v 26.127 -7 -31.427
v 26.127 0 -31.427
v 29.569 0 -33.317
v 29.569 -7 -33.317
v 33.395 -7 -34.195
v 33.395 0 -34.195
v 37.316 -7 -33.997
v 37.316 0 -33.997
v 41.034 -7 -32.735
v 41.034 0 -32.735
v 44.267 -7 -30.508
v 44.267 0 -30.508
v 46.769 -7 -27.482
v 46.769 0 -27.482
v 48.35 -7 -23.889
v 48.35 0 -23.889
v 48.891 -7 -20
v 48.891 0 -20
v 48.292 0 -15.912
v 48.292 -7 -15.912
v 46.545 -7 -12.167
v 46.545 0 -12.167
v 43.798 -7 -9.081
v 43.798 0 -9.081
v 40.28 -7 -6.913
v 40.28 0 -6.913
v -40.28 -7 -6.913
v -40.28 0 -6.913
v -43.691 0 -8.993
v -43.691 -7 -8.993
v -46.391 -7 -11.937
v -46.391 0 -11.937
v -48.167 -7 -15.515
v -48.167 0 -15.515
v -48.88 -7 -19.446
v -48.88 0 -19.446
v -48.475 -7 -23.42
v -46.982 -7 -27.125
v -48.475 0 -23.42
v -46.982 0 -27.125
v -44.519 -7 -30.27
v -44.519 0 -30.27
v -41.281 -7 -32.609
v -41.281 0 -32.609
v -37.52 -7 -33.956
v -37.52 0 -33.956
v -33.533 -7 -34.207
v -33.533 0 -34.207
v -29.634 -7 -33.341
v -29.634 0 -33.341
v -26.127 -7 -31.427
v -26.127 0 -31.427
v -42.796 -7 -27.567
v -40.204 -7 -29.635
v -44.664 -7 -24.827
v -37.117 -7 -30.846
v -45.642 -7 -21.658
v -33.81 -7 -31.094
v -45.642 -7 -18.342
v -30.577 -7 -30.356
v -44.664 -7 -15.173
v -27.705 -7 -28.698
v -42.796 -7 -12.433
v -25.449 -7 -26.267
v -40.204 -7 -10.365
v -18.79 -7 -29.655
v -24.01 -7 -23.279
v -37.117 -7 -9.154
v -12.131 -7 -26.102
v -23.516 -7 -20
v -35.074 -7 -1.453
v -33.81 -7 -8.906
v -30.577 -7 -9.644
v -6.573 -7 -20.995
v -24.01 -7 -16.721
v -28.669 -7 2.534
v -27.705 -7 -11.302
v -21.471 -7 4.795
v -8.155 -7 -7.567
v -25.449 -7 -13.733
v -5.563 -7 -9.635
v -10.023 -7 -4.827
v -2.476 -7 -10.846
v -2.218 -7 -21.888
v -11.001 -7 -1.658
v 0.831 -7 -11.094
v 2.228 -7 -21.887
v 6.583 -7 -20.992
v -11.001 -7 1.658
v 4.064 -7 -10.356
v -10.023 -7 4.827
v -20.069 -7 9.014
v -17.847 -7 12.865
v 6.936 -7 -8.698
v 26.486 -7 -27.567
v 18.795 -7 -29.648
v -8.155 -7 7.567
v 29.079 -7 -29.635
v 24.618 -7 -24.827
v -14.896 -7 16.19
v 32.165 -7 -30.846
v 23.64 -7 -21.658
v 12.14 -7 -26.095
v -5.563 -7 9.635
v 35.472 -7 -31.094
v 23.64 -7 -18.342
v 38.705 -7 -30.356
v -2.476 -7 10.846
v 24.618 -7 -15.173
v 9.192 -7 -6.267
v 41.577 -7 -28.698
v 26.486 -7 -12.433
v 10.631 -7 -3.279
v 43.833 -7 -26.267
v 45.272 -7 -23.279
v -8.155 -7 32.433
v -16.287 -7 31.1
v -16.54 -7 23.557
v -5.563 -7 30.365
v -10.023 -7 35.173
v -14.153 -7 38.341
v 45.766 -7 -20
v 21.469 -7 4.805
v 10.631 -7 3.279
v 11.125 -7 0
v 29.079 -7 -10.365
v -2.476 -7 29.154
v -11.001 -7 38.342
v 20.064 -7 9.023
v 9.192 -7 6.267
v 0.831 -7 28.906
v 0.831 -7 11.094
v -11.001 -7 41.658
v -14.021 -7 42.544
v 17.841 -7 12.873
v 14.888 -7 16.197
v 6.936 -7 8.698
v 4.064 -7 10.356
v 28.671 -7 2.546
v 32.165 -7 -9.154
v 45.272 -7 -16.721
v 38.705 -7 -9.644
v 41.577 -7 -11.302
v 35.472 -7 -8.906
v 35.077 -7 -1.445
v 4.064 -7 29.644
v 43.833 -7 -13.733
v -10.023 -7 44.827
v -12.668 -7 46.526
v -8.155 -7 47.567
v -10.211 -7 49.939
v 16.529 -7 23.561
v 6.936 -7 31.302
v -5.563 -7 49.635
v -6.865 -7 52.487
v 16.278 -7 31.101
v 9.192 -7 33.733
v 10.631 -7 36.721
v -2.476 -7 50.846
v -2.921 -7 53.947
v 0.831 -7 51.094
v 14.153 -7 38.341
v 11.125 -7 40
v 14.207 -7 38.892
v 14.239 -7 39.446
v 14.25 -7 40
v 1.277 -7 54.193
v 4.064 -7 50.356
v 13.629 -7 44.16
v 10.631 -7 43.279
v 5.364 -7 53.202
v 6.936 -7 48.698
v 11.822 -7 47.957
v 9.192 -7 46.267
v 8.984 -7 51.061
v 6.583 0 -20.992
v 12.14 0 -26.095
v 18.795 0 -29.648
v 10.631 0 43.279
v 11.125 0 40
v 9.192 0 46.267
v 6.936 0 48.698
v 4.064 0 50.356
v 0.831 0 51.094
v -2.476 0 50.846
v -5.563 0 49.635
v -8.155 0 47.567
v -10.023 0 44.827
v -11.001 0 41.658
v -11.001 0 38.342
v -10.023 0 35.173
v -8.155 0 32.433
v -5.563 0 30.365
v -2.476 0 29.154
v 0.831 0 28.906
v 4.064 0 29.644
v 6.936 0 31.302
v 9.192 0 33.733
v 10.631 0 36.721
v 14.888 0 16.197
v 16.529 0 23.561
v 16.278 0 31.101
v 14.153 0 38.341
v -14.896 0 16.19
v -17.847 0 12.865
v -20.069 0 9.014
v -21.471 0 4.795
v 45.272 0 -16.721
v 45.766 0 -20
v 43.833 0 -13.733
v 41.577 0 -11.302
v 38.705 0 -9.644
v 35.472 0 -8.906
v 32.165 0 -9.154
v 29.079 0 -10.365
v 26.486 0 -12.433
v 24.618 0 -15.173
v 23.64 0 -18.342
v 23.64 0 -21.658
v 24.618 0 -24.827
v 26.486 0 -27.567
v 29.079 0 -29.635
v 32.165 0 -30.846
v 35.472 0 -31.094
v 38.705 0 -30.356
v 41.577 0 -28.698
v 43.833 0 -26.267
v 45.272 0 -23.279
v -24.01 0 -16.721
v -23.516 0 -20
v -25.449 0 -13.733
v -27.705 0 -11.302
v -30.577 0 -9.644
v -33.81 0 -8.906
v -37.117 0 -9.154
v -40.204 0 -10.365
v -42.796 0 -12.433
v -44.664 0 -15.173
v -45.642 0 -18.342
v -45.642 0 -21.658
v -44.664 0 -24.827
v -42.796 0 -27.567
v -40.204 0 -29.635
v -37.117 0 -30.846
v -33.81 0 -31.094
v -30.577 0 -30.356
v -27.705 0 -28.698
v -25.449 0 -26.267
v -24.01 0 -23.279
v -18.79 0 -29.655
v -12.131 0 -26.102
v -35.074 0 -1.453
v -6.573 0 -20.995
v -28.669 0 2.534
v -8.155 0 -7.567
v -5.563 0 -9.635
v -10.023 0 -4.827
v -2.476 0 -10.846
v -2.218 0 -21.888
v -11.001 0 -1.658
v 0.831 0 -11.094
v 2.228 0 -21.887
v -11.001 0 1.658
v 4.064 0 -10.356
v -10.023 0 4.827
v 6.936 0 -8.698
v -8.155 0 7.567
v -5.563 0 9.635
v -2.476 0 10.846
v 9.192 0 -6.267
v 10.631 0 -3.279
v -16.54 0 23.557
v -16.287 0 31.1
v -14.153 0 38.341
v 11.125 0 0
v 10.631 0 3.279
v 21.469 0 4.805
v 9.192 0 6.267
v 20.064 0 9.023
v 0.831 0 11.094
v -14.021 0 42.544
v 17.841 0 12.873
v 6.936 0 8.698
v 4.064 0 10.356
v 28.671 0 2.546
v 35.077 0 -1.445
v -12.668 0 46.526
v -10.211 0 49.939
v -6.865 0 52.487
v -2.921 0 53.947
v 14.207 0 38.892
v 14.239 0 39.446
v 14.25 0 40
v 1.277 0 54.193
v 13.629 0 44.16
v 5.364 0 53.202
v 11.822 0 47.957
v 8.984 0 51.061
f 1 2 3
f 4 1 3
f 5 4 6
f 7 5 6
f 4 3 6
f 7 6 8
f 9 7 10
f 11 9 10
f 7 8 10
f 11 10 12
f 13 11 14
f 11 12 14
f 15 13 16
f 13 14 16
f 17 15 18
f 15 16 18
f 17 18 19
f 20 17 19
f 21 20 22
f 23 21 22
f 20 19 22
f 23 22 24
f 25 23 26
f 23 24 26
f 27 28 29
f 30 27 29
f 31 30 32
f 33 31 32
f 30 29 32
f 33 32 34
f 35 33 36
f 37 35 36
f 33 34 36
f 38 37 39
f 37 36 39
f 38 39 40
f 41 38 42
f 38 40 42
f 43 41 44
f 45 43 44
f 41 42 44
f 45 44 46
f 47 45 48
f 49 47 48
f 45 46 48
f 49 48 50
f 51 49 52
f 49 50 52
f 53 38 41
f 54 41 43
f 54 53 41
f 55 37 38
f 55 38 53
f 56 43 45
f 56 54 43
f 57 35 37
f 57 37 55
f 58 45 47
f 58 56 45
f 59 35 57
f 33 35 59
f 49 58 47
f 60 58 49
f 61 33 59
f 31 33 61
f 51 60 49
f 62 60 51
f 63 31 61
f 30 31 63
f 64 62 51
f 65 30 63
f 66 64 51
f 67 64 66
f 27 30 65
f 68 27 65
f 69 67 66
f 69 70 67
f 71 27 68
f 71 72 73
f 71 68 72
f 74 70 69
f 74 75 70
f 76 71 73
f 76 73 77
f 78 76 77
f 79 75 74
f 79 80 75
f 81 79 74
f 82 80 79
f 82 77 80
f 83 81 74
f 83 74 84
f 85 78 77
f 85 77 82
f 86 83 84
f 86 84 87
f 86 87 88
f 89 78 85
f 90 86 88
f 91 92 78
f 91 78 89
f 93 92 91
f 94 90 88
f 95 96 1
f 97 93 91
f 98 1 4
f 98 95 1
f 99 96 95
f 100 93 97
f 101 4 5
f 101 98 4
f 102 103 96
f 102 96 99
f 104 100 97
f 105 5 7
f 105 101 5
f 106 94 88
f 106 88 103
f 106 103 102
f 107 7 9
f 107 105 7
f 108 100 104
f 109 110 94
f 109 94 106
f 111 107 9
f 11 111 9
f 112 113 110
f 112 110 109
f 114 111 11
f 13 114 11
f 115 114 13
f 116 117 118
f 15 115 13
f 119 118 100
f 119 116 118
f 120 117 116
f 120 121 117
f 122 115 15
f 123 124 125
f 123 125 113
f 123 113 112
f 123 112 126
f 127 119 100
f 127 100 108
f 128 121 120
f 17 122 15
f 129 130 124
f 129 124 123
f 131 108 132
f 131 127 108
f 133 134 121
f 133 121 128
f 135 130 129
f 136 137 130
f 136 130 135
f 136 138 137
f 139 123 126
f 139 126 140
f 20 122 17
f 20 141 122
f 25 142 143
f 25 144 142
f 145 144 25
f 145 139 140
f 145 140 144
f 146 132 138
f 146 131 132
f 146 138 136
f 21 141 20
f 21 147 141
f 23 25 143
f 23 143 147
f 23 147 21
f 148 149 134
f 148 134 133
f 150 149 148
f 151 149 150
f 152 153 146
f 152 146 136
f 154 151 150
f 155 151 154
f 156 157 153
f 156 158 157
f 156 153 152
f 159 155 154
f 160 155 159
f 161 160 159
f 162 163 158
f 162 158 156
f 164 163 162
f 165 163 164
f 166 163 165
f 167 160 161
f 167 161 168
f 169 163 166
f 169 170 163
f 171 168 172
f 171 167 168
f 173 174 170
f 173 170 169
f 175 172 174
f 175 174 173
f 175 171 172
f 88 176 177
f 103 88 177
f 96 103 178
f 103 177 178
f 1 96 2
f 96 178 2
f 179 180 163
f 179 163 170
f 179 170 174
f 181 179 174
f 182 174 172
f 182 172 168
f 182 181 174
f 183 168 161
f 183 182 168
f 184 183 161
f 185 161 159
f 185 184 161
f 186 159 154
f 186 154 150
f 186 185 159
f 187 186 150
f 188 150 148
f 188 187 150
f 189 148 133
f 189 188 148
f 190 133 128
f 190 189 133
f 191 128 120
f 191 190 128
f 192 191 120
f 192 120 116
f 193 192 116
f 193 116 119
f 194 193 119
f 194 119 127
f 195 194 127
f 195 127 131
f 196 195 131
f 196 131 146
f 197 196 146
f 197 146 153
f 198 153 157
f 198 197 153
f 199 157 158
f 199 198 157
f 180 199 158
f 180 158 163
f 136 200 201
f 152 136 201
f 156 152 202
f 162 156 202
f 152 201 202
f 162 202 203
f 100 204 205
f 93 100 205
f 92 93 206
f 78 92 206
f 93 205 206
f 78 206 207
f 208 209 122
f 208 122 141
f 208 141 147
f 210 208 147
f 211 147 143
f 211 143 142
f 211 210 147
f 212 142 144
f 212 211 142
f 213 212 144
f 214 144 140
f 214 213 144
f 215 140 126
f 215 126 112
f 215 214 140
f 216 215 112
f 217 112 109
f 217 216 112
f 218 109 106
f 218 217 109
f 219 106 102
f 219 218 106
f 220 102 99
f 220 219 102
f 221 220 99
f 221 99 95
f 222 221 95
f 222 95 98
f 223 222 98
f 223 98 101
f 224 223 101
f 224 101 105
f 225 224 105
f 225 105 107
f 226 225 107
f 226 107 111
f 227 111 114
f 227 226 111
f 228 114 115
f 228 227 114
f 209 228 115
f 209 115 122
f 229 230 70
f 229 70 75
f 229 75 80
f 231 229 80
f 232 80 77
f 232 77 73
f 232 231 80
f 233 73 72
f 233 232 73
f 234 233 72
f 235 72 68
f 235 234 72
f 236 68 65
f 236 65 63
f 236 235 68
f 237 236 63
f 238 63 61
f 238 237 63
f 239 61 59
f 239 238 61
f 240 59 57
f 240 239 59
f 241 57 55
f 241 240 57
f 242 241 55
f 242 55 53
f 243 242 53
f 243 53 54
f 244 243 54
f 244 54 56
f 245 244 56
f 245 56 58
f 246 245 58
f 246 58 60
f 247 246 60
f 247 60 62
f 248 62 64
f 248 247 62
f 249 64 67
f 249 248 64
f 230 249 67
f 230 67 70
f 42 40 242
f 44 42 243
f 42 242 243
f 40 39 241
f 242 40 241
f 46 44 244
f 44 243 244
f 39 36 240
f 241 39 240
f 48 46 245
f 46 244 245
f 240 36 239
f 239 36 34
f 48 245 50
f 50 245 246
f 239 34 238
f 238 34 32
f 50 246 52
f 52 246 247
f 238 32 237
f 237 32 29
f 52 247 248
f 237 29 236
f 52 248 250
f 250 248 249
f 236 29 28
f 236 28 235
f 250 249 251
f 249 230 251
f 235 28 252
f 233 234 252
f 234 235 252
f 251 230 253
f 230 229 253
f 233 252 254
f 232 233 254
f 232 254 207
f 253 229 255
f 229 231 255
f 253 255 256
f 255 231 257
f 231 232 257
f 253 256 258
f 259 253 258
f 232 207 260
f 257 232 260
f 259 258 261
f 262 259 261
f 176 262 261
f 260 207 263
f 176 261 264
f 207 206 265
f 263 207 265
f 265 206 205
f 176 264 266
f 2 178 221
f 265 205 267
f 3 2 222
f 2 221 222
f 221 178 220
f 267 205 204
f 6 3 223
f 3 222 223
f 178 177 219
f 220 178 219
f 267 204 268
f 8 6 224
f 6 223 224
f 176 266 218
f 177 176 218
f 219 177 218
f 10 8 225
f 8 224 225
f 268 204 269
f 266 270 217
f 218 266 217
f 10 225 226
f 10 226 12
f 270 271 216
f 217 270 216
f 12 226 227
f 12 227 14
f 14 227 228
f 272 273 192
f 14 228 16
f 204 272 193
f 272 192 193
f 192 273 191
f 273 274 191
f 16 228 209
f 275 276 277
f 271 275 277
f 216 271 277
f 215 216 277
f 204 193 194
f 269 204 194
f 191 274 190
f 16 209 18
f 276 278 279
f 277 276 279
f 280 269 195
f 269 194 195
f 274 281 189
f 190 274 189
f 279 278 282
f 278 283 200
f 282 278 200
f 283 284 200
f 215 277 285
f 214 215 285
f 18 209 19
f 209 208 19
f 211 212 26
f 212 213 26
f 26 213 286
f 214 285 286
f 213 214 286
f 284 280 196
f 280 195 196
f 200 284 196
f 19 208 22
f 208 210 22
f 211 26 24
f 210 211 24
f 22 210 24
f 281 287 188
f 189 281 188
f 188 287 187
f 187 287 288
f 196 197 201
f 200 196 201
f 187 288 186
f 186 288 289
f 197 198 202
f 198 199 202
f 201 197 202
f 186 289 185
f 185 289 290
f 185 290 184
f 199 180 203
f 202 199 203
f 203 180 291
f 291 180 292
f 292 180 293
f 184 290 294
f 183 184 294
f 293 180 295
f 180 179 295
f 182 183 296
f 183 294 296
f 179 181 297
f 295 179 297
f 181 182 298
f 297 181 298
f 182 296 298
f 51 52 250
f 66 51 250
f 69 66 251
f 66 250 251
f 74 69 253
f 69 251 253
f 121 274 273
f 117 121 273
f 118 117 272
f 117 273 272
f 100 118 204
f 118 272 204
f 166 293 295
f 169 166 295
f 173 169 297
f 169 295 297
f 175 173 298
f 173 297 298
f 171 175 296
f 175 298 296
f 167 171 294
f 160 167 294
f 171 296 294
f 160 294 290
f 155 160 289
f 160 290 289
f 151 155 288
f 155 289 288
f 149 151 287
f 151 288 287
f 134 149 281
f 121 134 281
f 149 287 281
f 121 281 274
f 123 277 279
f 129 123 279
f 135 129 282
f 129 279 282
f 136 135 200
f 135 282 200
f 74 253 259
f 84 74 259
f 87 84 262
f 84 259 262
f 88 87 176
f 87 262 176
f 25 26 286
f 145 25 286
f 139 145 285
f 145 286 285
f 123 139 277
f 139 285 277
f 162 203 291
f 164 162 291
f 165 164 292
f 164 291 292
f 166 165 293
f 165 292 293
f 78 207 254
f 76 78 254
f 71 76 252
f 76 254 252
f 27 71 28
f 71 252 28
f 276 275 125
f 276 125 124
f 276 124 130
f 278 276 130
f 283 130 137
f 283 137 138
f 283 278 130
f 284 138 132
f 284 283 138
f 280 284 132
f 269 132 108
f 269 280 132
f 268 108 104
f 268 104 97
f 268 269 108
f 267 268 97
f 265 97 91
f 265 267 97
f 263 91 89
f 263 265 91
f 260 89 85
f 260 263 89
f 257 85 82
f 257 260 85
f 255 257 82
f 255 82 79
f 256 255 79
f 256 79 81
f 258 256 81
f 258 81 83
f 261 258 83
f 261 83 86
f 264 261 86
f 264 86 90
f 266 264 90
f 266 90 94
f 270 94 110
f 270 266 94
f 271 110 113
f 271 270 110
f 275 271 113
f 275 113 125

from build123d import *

# Parameters (mm, degrees)
F0_R     = 11.125
F1_DEPTH = 7


with BuildPart() as f1:
    # F0 (on Front) → F1 (new body)
    with BuildSketch(Plane.XZ):
        with BuildLine():
            ThreePointArc((-10.632867, 8.318182), (0, 16.5), (10.632867, 8.318182))
            ThreePointArc((10.632867, 8.318182), (13.056476, 12.097679), (14.888415, 16.196762))
            ThreePointArc((14.888415, 16.196762), (16.6416, 27.339077), (14.153044, 38.340529))
            ThreePointArc((14.153044, 38.340529), (0, 25.75), (-14.153044, 38.340529))
            ThreePointArc((-14.153044, 38.340529), (-16.65233, 27.336563), (-14.895904, 16.189874))
            ThreePointArc((-14.895904, 16.189874), (-13.06061, 12.093603), (-10.632867, 8.318182))
        make_face()
        with BuildLine():
            ThreePointArc((-12.52019, 5.049242), (-11.691343, 6.75), (-10.632867, 8.318182))
            ThreePointArc((-10.632867, 8.318182), (-13.06061, 12.093603), (-14.895904, 16.189874))
            ThreePointArc((-14.895904, 16.189874), (-19.055102, 10.995594), (-21.471015, 4.795365))
            ThreePointArc((-21.471015, 4.795365), (-17.005135, 5.2584), (-12.52019, 5.049242))
        make_face()
        with BuildLine():
            ThreePointArc((-6.57289, -20.995169), (-3.943063, -17.357621), (-1.887323, -13.367423))
            ThreePointArc((-1.887323, -13.367423), (-14.289419, -8.25), (-12.52019, 5.049242))
            ThreePointArc((-12.52019, 5.049242), (-17.005135, 5.2584), (-21.471015, 4.795365))
            ThreePointArc((-21.471015, 4.795365), (-31.997135, 0.74251), (-40.280394, -6.913369))
            ThreePointArc((-40.280394, -6.913369), (-26.808348, -8.095723), (-20.391016, -20))
            ThreePointArc((-20.391016, -20), (-21.905588, -26.393073), (-26.12735, -31.42716))
            ThreePointArc((-26.12735, -31.42716), (-15.347993, -28.089622), (-6.57289, -20.995169))
        make_face()
        with BuildLine():
            ThreePointArc((6.582599, -20.992127), (3.948659, -17.356079), (1.887323, -13.367423))
            ThreePointArc((1.887323, -13.367423), (0, -13.5), (-1.887323, -13.367423))
            ThreePointArc((-1.887323, -13.367423), (-3.943063, -17.357621), (-6.57289, -20.995169))
            ThreePointArc((-6.57289, -20.995169), (0.005087, -21.999999), (6.582599, -20.992127))
        make_face()
        with BuildLine():
            ThreePointArc((21.468795, 4.805294), (17.003672, 5.264018), (12.52019, 5.049242))
            ThreePointArc((12.52019, 5.049242), (14.289419, -8.25), (1.887323, -13.367423))
            ThreePointArc((1.887323, -13.367423), (3.948659, -17.356079), (6.582599, -20.992127))
            ThreePointArc((6.582599, -20.992127), (15.355535, -28.081587), (26.12735, -31.42716))
            ThreePointArc((26.12735, -31.42716), (22.300154, -12.875), (40.280394, -6.913369))
            ThreePointArc((40.280394, -6.913369), (32.000323, 0.753059), (21.468795, 4.805294))
        make_face()
        with BuildLine():
            ThreePointArc((12.52019, 5.049242), (13.252784, 2.571715), (13.5, 0))
            ThreePointArc((13.5, 0), (10.19139, -8.853562), (1.887323, -13.367423))
            ThreePointArc((1.887323, -13.367423), (14.289419, -8.25), (12.52019, 5.049242))
        make_face()
        with BuildLine():
            ThreePointArc((1.887323, -13.367423), (10.19139, -8.853562), (13.5, 0))
            ThreePointArc((13.5, 0), (13.252784, 2.571715), (12.52019, 5.049242))
            ThreePointArc((12.52019, 5.049242), (11.691343, 6.75), (10.632867, 8.318182))
            ThreePointArc((10.632867, 8.318182), (0, 13.5), (-10.632867, 8.318182))
            ThreePointArc((-10.632867, 8.318182), (-11.691343, 6.75), (-12.52019, 5.049242))
            ThreePointArc((-12.52019, 5.049242), (-11.691343, -6.75), (-1.887323, -13.367423))
            ThreePointArc((-1.887323, -13.367423), (0, -13.5), (1.887323, -13.367423))
        make_face()
        Circle(F0_R, mode=Mode.SUBTRACT)
        with BuildLine():
            ThreePointArc((-12.52019, 5.049242), (-14.289419, -8.25), (-1.887323, -13.367423))
            ThreePointArc((-1.887323, -13.367423), (-11.691343, -6.75), (-12.52019, 5.049242))
        make_face()
        with BuildLine():
            ThreePointArc((-10.632867, 8.318182), (0, 13.5), (10.632867, 8.318182))
            ThreePointArc((10.632867, 8.318182), (0, 16.5), (-10.632867, 8.318182))
        make_face()
        with BuildLine():
            ThreePointArc((-14.153044, 38.340529), (0, 25.75), (14.153044, 38.340529))
            ThreePointArc((14.153044, 38.340529), (14.22574, 39.168849), (14.25, 40))
            ThreePointArc((14.25, 40), (-0.831151, 54.22574), (-14.153044, 38.340529))
        make_face()
        with Locations((0, 40)):
            Circle(F0_R, mode=Mode.SUBTRACT)
        with BuildLine():
            ThreePointArc((10.632867, 8.318182), (11.691343, 6.75), (12.52019, 5.049242))
            ThreePointArc((12.52019, 5.049242), (17.003672, 5.264018), (21.468795, 4.805294))
            ThreePointArc((21.468795, 4.805294), (19.050015, 11.004405), (14.888415, 16.196762))
            ThreePointArc((14.888415, 16.196762), (13.056476, 12.097679), (10.632867, 8.318182))
        make_face()
        with BuildLine():
            ThreePointArc((48.891016, -20), (46.545293, -12.167332), (40.280394, -6.913369))
            ThreePointArc((40.280394, -6.913369), (22.300154, -12.875), (26.12735, -31.42716))
            ThreePointArc((26.12735, -31.42716), (41.034089, -32.735428), (48.891016, -20))
        make_face()
        with Locations((34.641016, -20)):
            Circle(F0_R, mode=Mode.SUBTRACT)
        with BuildLine():
            ThreePointArc((-40.280394, -6.913369), (-46.981878, -27.125), (-26.12735, -31.42716))
            ThreePointArc((-26.12735, -31.42716), (-21.905588, -26.393073), (-20.391016, -20))
            ThreePointArc((-20.391016, -20), (-26.808348, -8.095723), (-40.280394, -6.913369))
        make_face()
        with Locations((-34.641016, -20)):
            Circle(F0_R, mode=Mode.SUBTRACT)
    extrude(amount=F1_DEPTH)


solid = f1.part
